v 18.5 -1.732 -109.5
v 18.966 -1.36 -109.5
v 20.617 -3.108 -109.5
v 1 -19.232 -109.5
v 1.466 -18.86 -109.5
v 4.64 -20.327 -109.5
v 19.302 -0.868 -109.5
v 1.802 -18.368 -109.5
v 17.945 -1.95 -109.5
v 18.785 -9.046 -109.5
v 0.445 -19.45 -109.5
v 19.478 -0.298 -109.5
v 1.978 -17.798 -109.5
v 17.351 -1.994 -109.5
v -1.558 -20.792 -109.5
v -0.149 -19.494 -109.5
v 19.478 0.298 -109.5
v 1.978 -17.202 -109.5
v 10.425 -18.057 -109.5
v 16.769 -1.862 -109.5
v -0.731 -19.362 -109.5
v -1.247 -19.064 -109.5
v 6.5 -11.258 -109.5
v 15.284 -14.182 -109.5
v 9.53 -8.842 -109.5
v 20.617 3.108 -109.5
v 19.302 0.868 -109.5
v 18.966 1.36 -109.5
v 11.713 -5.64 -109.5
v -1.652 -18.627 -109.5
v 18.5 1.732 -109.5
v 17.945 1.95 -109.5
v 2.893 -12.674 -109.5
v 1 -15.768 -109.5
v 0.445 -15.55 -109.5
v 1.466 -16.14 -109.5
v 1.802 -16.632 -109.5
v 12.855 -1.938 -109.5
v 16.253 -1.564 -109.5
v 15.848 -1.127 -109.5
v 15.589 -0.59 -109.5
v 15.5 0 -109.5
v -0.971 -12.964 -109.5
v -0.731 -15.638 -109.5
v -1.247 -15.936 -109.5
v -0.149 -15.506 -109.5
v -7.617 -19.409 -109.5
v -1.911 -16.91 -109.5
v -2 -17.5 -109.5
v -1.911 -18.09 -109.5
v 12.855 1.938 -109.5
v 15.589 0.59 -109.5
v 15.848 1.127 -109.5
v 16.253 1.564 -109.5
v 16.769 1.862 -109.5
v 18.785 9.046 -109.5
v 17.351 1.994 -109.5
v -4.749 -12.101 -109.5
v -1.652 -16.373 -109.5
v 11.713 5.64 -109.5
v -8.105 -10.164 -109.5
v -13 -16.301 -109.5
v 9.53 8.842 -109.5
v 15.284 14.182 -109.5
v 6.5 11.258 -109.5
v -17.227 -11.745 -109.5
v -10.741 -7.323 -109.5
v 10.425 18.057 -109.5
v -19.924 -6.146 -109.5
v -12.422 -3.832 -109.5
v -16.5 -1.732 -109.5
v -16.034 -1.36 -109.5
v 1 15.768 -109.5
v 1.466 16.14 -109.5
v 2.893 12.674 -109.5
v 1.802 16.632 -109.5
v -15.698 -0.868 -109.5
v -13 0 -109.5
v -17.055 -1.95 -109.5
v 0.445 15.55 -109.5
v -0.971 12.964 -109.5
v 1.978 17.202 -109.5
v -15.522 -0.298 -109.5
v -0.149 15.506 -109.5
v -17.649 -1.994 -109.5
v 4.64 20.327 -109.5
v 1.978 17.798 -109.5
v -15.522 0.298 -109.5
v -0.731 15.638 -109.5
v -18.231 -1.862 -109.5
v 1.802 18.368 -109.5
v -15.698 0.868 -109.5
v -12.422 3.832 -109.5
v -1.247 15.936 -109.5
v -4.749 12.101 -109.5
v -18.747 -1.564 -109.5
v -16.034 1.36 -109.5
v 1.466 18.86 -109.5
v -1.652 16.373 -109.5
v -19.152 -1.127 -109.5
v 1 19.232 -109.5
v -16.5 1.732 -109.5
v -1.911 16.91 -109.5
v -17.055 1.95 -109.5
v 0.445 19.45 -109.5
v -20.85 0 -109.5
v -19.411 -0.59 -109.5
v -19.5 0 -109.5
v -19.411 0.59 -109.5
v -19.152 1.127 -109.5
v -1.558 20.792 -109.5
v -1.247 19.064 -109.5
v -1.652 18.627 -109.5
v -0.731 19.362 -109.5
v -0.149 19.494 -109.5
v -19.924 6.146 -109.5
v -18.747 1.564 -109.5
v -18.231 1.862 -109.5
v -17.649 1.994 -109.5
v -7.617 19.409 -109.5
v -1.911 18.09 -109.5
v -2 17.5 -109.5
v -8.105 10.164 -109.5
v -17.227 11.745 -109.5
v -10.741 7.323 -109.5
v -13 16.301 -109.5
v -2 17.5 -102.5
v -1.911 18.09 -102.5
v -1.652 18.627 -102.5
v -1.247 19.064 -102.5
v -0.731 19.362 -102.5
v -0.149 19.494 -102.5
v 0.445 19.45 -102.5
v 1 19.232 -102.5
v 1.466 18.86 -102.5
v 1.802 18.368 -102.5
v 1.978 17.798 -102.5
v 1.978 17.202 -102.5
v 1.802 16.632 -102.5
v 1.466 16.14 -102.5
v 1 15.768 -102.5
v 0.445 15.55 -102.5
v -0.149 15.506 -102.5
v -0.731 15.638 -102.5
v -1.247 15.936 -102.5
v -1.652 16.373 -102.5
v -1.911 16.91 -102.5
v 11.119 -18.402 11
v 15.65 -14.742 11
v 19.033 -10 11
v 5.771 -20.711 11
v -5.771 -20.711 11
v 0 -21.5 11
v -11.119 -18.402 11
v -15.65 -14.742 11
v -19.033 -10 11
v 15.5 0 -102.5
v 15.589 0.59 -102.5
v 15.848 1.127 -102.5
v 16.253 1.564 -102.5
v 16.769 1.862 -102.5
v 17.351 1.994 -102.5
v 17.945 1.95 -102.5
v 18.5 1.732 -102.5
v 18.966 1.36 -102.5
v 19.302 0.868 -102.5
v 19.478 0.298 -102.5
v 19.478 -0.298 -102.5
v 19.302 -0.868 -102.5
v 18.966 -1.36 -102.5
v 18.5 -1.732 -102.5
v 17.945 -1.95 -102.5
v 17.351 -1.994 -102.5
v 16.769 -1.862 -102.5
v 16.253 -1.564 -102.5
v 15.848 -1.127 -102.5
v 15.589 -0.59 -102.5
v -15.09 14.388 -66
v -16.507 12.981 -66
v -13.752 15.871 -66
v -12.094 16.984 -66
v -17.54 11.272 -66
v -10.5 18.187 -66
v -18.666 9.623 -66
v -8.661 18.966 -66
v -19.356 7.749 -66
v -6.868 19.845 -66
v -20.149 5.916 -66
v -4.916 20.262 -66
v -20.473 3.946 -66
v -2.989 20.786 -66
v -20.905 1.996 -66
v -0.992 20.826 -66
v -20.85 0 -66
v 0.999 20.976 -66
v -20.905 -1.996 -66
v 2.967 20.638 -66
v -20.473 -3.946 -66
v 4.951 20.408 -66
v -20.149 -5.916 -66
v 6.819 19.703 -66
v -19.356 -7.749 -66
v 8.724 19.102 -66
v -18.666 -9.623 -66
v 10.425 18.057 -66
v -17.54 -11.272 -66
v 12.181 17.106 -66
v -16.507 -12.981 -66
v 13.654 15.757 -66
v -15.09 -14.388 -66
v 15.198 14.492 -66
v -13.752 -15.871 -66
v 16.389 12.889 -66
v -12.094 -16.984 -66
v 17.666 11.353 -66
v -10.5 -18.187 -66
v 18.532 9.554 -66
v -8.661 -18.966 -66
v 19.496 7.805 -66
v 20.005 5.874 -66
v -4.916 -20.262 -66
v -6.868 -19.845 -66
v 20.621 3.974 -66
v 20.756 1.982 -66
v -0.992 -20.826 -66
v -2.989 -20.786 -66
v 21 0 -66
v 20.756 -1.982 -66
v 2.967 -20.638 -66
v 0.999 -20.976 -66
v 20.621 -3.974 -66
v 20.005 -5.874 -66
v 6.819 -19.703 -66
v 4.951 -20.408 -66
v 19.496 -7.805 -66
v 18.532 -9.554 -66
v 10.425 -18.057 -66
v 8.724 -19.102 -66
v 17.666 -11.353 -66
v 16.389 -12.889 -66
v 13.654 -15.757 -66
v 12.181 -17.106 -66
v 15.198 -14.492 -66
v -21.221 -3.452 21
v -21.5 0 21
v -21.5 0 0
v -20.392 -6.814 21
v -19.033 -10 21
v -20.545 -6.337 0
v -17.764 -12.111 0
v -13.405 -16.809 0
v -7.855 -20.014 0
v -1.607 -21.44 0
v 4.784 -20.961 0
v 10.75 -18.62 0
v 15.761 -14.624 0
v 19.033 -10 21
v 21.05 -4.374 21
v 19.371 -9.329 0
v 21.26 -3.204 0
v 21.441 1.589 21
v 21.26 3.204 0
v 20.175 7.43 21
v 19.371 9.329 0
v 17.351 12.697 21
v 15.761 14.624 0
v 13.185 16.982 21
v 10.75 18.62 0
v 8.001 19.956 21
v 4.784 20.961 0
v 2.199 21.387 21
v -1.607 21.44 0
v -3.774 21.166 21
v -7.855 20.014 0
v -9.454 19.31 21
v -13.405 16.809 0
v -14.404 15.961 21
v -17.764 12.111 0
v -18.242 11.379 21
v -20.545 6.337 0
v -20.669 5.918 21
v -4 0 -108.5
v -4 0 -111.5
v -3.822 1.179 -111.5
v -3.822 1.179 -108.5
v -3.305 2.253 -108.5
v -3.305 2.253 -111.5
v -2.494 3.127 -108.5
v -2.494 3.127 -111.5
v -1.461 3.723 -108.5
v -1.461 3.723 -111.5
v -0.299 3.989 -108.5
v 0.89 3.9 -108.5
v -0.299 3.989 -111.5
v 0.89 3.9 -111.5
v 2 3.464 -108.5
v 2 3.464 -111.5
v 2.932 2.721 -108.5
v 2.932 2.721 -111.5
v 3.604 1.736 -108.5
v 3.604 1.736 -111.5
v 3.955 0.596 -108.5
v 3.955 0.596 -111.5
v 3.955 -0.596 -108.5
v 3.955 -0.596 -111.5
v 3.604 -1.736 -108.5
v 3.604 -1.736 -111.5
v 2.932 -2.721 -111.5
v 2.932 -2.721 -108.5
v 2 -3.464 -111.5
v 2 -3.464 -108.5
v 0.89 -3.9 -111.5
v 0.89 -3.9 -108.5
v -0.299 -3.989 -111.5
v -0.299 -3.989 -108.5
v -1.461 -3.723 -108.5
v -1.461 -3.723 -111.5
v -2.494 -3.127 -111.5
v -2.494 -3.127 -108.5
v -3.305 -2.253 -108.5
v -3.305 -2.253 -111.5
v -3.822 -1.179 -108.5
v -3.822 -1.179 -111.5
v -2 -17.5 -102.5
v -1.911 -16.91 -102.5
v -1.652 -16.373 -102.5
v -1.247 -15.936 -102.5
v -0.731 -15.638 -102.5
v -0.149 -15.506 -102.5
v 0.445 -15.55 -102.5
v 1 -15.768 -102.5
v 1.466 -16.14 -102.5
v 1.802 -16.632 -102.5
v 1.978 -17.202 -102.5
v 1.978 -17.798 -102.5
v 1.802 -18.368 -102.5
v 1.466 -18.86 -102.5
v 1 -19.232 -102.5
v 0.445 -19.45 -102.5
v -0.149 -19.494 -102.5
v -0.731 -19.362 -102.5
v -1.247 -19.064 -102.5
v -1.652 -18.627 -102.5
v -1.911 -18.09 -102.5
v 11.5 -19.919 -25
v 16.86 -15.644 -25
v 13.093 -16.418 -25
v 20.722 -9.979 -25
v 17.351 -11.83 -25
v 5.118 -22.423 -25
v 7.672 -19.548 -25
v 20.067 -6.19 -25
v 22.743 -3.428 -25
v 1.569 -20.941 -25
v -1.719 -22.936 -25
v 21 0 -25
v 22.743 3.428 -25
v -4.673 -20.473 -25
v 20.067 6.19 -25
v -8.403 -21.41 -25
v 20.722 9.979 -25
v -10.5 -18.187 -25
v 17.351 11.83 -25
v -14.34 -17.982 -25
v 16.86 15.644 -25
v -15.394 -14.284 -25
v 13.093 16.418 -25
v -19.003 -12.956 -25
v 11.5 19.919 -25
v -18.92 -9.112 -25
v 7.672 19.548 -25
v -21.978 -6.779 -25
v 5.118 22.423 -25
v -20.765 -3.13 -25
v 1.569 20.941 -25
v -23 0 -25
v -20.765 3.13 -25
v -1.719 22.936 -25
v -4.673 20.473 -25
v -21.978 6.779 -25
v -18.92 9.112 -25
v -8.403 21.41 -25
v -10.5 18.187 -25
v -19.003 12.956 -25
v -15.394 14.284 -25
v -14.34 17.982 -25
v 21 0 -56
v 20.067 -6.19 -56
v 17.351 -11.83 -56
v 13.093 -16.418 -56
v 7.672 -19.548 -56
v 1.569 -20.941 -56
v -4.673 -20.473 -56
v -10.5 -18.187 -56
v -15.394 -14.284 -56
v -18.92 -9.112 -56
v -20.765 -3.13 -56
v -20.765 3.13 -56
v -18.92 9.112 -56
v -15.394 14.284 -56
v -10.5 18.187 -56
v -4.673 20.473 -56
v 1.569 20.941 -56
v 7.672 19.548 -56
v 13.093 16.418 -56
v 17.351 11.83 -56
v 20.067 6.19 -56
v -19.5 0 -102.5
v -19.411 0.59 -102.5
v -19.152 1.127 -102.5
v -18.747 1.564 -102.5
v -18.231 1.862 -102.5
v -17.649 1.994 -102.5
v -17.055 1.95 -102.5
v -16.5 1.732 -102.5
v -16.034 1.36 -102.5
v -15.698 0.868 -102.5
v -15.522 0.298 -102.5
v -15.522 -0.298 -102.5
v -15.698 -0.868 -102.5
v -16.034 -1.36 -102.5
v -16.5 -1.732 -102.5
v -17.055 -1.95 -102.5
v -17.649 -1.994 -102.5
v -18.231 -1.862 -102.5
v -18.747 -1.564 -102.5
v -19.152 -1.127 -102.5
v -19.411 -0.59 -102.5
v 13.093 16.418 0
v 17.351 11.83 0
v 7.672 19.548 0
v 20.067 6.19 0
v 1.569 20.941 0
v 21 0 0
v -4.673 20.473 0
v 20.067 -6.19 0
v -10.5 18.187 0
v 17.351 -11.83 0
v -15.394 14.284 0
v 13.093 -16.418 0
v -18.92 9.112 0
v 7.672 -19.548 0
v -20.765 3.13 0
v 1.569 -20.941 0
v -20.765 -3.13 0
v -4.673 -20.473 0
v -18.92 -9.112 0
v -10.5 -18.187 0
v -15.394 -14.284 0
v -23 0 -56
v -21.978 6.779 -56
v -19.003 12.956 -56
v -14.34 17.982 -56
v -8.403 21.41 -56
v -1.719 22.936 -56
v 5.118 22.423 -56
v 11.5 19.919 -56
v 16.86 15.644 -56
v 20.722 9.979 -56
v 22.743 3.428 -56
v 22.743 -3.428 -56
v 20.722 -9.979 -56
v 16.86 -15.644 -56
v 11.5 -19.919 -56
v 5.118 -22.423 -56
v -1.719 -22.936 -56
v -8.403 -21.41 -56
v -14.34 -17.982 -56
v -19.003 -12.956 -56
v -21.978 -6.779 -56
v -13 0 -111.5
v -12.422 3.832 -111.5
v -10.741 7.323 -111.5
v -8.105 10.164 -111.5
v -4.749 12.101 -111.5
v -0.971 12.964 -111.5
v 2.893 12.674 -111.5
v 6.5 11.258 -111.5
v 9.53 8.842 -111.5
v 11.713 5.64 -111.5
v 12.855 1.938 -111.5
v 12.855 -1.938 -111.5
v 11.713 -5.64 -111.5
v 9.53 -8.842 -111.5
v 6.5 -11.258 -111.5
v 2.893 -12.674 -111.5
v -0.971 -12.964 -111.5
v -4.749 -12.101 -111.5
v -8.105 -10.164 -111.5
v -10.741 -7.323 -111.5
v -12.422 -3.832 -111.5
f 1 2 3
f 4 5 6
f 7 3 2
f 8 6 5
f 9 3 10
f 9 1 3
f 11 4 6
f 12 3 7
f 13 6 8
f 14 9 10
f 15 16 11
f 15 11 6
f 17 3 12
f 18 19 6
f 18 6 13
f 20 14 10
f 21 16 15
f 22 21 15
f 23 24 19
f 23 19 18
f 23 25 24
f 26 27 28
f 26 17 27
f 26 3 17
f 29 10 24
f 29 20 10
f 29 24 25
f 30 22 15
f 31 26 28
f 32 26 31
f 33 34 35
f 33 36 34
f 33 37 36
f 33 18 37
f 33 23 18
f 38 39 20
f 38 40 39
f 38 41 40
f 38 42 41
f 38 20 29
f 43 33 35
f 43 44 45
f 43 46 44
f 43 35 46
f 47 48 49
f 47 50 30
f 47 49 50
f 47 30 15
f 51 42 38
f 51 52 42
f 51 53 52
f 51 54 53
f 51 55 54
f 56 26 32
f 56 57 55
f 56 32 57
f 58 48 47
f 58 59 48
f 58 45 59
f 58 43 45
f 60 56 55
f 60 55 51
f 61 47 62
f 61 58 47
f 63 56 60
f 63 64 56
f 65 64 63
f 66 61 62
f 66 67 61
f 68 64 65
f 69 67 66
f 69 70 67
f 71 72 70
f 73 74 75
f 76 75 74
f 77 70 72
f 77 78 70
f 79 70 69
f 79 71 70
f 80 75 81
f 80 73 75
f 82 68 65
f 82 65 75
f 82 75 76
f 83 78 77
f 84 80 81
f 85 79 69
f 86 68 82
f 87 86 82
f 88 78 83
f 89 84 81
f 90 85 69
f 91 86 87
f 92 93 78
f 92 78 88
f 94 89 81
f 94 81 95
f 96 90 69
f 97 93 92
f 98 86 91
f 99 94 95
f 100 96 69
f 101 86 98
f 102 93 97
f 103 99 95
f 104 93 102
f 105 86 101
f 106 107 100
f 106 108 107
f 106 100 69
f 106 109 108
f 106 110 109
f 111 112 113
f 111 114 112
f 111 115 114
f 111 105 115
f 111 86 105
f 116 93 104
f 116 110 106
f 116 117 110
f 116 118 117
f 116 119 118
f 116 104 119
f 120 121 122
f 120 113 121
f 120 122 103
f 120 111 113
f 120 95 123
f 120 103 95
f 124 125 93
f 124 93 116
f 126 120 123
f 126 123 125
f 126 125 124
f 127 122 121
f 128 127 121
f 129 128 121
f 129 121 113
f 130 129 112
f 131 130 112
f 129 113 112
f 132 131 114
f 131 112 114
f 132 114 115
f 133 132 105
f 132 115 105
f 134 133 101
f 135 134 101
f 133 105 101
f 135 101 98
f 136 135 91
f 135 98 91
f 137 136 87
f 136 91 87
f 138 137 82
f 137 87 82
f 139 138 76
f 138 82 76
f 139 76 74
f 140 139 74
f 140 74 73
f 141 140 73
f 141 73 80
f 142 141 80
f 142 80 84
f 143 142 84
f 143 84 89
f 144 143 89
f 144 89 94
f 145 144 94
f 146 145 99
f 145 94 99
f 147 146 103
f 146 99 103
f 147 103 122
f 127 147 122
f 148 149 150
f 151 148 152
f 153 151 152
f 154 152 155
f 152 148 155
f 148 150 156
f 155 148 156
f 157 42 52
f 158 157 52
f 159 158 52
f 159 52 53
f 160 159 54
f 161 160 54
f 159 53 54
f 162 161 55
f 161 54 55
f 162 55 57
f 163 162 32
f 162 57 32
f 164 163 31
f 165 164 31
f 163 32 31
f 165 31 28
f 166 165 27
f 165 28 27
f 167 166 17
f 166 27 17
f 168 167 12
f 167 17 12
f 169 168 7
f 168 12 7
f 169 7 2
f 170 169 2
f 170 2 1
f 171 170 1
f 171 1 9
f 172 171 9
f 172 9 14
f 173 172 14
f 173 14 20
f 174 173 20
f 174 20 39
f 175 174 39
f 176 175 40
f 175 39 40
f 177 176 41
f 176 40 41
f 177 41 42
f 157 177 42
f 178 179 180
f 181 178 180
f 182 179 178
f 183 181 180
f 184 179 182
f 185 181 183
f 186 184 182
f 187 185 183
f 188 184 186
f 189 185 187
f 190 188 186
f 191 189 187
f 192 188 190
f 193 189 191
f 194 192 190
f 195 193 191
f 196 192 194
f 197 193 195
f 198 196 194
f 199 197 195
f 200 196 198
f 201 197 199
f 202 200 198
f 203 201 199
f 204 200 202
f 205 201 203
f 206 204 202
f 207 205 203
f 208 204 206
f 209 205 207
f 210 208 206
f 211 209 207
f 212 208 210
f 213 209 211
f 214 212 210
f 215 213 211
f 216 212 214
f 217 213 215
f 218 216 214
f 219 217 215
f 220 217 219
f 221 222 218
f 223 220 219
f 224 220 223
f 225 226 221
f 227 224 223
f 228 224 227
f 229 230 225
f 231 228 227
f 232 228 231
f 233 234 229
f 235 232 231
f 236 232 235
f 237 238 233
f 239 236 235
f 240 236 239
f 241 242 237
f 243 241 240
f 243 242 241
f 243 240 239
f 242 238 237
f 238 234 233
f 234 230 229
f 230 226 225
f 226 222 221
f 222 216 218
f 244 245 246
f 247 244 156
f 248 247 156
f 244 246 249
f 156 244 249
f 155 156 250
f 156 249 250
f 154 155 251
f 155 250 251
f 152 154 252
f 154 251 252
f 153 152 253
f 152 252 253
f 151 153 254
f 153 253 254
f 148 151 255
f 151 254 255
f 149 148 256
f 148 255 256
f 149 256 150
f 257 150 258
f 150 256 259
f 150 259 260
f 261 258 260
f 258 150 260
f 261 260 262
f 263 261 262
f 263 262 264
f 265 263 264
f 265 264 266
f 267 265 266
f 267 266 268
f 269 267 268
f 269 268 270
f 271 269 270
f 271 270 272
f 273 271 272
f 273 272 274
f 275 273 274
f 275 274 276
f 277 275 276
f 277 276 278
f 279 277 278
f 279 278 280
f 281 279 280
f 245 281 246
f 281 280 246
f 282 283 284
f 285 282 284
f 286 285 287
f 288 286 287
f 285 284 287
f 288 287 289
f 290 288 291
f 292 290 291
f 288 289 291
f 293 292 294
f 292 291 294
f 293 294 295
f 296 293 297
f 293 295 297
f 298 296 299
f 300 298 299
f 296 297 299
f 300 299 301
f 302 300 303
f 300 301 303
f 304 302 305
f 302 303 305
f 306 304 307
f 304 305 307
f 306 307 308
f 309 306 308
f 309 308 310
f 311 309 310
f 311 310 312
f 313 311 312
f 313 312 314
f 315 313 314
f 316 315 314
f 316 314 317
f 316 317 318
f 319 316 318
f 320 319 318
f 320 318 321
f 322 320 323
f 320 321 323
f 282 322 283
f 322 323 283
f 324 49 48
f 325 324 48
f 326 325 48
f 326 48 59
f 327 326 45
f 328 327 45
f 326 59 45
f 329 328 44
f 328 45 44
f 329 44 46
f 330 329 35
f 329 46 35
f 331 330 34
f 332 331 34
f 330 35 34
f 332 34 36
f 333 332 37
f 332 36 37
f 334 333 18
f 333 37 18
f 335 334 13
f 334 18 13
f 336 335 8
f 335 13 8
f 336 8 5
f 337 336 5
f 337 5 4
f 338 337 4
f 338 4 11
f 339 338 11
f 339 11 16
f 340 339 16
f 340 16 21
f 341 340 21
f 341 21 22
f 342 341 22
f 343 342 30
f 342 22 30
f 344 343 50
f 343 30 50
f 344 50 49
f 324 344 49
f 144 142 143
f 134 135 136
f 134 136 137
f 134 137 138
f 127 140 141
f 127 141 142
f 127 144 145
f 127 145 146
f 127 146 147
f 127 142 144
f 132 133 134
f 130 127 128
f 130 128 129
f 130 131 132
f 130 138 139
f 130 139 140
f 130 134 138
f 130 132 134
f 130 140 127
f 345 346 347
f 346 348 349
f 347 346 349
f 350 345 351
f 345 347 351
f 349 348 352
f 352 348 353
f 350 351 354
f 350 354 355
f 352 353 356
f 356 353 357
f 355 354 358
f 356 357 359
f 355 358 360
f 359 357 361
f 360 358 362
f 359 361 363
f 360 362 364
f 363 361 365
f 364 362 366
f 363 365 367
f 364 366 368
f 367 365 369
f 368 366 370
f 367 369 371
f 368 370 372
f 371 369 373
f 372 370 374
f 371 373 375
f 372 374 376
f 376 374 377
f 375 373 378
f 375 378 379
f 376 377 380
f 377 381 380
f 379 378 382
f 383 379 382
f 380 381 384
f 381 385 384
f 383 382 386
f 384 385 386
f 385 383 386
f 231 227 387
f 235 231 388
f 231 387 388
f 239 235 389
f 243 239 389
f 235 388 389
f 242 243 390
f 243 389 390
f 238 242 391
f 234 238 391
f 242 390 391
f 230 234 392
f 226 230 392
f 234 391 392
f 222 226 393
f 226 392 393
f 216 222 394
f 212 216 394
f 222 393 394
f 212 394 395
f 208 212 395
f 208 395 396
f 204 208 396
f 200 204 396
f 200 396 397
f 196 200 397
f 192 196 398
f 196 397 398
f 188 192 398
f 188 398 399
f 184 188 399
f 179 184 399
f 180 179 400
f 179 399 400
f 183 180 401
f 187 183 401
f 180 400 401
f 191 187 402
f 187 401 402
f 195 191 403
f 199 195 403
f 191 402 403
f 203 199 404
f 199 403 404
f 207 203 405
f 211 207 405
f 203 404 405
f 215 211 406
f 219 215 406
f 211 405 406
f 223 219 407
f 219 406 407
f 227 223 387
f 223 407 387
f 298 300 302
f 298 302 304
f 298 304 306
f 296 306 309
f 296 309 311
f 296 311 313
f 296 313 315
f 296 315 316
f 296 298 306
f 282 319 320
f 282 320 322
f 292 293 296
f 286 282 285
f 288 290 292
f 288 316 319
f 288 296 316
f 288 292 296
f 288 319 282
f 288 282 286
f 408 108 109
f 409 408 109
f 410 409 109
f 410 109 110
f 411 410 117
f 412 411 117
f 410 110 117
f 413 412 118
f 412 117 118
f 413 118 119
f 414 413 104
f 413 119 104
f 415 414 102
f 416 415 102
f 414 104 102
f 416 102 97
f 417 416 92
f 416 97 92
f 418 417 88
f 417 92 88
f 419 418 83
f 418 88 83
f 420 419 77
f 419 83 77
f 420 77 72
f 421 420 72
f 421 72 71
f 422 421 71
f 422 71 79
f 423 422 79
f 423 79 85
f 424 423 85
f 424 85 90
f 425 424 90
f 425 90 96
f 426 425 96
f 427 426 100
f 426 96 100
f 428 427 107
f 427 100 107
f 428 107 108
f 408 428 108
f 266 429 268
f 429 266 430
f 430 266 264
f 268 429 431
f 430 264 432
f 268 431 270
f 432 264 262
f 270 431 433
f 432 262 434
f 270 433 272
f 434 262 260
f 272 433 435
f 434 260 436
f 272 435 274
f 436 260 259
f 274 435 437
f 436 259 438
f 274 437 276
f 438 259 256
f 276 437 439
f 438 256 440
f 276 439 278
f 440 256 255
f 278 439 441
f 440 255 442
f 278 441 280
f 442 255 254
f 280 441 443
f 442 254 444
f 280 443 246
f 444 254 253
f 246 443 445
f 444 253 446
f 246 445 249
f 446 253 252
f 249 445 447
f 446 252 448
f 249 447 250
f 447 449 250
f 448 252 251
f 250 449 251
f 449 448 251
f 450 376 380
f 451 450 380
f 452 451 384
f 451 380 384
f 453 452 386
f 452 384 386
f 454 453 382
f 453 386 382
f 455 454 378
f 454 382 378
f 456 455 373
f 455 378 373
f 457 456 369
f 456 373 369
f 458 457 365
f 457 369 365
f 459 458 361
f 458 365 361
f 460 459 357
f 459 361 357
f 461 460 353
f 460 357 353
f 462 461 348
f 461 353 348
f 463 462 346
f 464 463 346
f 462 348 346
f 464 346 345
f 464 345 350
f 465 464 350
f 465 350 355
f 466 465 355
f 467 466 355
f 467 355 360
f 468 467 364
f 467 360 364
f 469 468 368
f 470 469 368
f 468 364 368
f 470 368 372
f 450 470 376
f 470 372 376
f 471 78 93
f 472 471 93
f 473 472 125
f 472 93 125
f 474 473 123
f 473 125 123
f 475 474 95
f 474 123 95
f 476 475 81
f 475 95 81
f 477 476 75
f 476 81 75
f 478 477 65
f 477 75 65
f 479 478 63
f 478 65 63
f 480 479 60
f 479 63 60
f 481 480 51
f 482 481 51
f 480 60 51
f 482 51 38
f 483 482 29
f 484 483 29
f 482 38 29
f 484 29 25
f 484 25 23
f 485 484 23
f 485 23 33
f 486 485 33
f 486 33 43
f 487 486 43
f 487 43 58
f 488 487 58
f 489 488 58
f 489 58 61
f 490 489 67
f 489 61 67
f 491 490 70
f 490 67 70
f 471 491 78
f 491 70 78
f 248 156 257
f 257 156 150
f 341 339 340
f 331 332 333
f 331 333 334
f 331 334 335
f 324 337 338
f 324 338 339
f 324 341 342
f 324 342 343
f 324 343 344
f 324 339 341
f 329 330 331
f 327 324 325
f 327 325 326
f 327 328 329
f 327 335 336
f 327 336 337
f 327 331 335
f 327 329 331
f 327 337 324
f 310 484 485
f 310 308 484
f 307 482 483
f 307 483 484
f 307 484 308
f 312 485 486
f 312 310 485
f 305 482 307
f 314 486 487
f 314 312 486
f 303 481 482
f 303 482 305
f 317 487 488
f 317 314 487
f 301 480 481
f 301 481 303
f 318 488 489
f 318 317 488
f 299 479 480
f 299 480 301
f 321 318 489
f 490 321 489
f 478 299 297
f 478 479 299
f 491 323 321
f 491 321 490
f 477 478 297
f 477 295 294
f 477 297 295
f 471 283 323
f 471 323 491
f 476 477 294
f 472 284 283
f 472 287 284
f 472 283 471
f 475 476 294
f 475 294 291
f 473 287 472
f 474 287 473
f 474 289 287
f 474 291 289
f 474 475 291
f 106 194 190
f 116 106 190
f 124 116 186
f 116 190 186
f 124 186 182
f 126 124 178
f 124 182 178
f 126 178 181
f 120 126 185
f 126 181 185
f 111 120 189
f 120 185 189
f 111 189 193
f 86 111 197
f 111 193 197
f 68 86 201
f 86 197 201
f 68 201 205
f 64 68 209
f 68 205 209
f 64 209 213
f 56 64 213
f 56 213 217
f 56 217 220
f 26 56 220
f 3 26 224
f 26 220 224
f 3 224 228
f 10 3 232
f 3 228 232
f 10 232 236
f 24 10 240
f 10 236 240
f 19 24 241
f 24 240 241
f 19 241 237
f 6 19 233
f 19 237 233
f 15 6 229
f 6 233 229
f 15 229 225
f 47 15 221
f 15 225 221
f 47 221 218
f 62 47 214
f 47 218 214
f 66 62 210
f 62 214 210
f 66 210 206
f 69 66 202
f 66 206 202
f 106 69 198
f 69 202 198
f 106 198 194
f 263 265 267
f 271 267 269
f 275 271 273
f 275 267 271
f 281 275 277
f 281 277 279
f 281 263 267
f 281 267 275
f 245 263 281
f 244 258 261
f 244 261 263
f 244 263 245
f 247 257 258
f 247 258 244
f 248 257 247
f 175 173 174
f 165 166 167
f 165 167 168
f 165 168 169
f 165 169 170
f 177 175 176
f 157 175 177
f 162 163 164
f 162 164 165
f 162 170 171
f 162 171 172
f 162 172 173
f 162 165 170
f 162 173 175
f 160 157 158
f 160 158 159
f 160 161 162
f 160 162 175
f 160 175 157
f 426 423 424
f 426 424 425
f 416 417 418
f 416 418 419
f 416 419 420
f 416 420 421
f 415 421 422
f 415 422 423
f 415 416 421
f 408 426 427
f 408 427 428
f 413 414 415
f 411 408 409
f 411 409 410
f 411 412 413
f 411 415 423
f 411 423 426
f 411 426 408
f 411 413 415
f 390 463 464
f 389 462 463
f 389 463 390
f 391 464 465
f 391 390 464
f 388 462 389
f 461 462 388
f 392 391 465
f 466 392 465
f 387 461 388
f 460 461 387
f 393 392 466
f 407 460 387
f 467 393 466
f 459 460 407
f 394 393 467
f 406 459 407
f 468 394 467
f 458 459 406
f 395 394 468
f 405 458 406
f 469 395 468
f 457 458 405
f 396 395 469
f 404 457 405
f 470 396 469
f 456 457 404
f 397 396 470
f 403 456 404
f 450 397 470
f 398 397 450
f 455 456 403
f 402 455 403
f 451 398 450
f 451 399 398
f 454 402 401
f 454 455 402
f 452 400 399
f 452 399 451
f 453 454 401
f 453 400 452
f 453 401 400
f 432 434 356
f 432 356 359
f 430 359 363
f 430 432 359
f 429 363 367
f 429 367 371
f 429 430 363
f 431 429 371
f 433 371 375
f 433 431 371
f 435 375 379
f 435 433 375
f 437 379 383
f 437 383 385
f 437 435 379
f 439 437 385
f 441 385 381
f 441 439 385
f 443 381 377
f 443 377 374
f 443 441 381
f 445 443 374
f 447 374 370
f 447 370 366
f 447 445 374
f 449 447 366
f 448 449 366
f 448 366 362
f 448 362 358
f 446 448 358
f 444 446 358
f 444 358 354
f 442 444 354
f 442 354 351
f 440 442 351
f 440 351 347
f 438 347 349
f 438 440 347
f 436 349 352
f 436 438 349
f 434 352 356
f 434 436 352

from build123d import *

# Parameters (mm, degrees)
SKETCH1_R           = 21
BOSS_EXTRUDE1_DEPTH = 25
SKETCH2_R           = 23
BOSS_EXTRUDE2_DEPTH = 31
SKETCH3_R           = 21
BOSS_EXTRUDE3_DEPTH = 10
SKETCH4_R           = 20.85
BOSS_EXTRUDE4_DEPTH = 43.5
SKETCH5_R           = 13
BOSS_EXTRUDE5_DEPTH = 2
SKETCH6_R           = 4
CUT_EXTRUDE1_DEPTH  = 3
SKETCH7_R           = 21.5
BOSS_EXTRUDE6_DEPTH = 21
CUT_EXTRUDE2_START  = -10
CUT_EXTRUDE2_DEPTH  = 10
SKETCH9_R           = 2
CUT_EXTRUDE3_DEPTH  = 7


with BuildPart() as part:
    # Sketch1 → Boss-Extrude1 (new body)
    with BuildSketch(Plane.XY):
        Circle(SKETCH1_R)
    extrude(amount=-BOSS_EXTRUDE1_DEPTH)

    # Sketch2 → Boss-Extrude2 (add)
    with BuildSketch(Plane(origin=(0, 0, -25), x_dir=(-1, 0, 0), z_dir=(0, 0, -1))):
        Circle(SKETCH2_R)
    extrude(amount=BOSS_EXTRUDE2_DEPTH)

    # Sketch3 → Boss-Extrude3 (add)
    with BuildSketch(Plane(origin=(0, 0, -56), x_dir=(-1, 0, 0), z_dir=(0, 0, -1))):
        with Locations(Location((0, 0, 0), (0, 0, 180))):
            Circle(SKETCH3_R)
    extrude(amount=BOSS_EXTRUDE3_DEPTH)

    # Sketch4 → Boss-Extrude4 (add)
    with BuildSketch(Plane(origin=(0, 0, -66), x_dir=(-1, 0, 0), z_dir=(0, 0, -1))):
        Circle(SKETCH4_R)
    extrude(amount=BOSS_EXTRUDE4_DEPTH)

    # Sketch5 → Boss-Extrude5 (add)
    with BuildSketch(Plane(origin=(0, 0, -109.5), x_dir=(-1, 0, 0), z_dir=(0, 0, -1))):
        Circle(SKETCH5_R)
    extrude(amount=BOSS_EXTRUDE5_DEPTH)

    # Sketch6 → Cut-Extrude1 (cut)
    with BuildSketch(Plane(origin=(0, 0, -111.5), x_dir=(-1, 0, 0), z_dir=(0, 0, -1))):
        Circle(SKETCH6_R)
    extrude(amount=-CUT_EXTRUDE1_DEPTH, mode=Mode.SUBTRACT)

    # Sketch7 → Boss-Extrude6 (add)
    with BuildSketch(Plane.XY):
        with Locations(Location((0, 0, 0), (0, 0, 180))):
            Circle(SKETCH7_R)
    extrude(amount=BOSS_EXTRUDE6_DEPTH)

    # Sketch8 → Cut-Extrude2 (cut)
    with BuildSketch(Plane.XY.offset(21).offset(CUT_EXTRUDE2_START)):
        with BuildLine():
            Line((-19.032866311, -10), (19.032866311, -10))
            ThreePointArc((19.032866311, -10), (0, -21.5), (-19.032866311, -10))
        make_face()
    extrude(amount=CUT_EXTRUDE2_DEPTH, mode=Mode.SUBTRACT)

    # Sketch9 → Cut-Extrude3 (cut)
    with BuildSketch(Plane(origin=(0, 0, -109.5), x_dir=(-1, 0, 0), z_dir=(0, 0, -1))):
        with Locations((0, 17.5)):
            Circle(SKETCH9_R)
        with Locations((17.5, 0)):
            Circle(SKETCH9_R)
        with Locations((0, -17.5)):
            Circle(SKETCH9_R)
        with Locations((-17.5, 0)):
            Circle(SKETCH9_R)
    extrude(amount=-CUT_EXTRUDE3_DEPTH, mode=Mode.SUBTRACT)


solid = part.part
